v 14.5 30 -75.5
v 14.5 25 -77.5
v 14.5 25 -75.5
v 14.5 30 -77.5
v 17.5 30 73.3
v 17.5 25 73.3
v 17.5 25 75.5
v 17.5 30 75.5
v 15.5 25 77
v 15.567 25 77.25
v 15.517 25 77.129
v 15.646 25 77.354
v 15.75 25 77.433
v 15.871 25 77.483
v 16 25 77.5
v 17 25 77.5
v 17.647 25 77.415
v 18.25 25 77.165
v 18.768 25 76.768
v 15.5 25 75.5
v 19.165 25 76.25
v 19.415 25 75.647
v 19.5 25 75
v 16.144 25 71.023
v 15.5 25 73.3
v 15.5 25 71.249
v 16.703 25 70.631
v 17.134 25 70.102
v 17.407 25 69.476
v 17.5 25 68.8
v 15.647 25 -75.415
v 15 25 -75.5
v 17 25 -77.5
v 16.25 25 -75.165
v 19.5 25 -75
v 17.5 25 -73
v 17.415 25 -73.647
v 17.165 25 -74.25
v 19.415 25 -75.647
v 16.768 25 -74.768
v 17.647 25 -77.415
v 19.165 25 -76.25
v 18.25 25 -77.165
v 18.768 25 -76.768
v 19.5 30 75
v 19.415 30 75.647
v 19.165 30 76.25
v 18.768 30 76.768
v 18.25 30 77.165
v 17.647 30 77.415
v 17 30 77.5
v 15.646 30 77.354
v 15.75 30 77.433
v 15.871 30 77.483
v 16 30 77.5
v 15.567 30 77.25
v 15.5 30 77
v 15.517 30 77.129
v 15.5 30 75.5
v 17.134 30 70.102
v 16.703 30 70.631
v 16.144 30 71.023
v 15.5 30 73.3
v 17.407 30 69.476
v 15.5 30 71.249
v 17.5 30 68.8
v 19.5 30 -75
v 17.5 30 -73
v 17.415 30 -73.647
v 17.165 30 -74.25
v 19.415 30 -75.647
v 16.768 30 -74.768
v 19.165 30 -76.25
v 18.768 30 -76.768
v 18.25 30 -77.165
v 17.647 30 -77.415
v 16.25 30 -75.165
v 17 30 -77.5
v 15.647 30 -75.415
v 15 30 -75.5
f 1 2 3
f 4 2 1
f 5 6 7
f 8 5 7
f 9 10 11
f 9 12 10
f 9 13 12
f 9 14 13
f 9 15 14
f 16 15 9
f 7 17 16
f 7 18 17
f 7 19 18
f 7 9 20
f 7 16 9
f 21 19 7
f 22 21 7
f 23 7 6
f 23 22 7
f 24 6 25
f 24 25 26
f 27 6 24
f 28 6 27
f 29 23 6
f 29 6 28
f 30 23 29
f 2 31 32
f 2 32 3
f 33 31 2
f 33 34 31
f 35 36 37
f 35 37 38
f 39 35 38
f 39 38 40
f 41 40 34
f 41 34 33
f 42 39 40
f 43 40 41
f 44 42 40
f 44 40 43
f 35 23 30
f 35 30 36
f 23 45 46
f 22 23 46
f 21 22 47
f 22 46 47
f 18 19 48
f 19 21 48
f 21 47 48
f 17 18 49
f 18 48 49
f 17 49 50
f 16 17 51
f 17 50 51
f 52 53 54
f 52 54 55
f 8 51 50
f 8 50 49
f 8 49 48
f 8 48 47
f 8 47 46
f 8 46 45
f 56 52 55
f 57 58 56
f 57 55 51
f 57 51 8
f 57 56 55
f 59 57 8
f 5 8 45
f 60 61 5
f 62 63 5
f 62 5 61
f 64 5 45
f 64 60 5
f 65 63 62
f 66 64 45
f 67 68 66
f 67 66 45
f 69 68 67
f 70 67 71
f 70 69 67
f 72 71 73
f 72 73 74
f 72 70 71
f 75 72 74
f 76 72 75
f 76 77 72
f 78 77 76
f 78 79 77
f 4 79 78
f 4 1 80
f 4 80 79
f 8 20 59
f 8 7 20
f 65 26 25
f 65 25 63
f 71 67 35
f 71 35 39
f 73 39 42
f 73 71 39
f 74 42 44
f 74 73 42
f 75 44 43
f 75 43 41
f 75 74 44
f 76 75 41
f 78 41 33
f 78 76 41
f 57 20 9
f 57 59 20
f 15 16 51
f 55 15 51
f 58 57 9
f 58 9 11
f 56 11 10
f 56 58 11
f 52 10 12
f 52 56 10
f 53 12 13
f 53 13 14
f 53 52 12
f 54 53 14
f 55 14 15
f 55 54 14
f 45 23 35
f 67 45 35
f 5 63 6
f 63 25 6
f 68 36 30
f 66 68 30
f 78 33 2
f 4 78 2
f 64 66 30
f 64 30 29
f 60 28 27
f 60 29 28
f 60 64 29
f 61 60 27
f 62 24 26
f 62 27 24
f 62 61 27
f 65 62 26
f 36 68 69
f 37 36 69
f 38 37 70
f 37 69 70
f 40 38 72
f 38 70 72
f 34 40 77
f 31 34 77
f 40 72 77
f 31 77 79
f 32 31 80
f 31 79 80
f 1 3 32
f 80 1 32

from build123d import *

# Parameters (mm, degrees)
SKETCH1_W                       = 39
SKETCH1_H                       = 155
BOSS_EXTRUDE1_DEPTH             = 2
BOSS_EXTRUDE2_DEPTH             = 38
SKETCH3_W                       = 2
SKETCH3_H                       = 2
BOSS_EXTRUDE3_DEPTH             = 38
SKETCH4_W                       = 2
SKETCH4_H                       = 2
BOSS_EXTRUDE4_DEPTH             = 151
SKETCH6_W                       = 35
SKETCH6_H                       = 2.2
CUT_EXTRUDE1_DEPTH              = 160.340045186
SKETCH7_W                       = 35
SKETCH7_H                       = 2.2
CUT_EXTRUDE2_DEPTH              = 89.490112442
SKETCH5_W                       = 31
SKETCH5_H                       = 2
BOSS_EXTRUDE5_DEPTH             = 2
BOSS_EXTRUDE6_REACH             = 91.367
SKETCH8_W                       = 2
SKETCH8_H                       = 2
BOSS_EXTRUDE6_DIRECTION_2_REACH = 91.367
SKETCH10_W                      = 2
SKETCH10_H                      = 2.2
SKETCH10_W_2                    = 2.2
SKETCH10_H_2                    = 2
BOSS_EXTRUDE8_DEPTH             = 2
SKETCH11_W                      = 2
SKETCH11_H                      = 2.2
SKETCH11_W_2                    = 2.2
SKETCH11_H_2                    = 2
BOSS_EXTRUDE9_DEPTH             = 2
FILLET2_R                       = 2.5
SKETCH14_W                      = 36.5
SKETCH14_H                      = 7.75
BOSS_EXTRUDE10_DEPTH            = 2
SKETCH13_W                      = 31
SKETCH13_H                      = 3
CUT_EXTRUDE4_DEPTH              = 2
FILLET3_R                       = 2
FILLET4_R                       = 0.5
SKETCH15_R                      = 5.1
CUT_EXTRUDE5_DEPTH              = 90.367219941
SKETCH16_R                      = 7.1
BOSS_EXTRUDE11_DEPTH            = 1
FILLET5_R                       = 0.5
CUT_EXTRUDE3_DEPTH              = 160.340045186
FILLET6_R                       = 0.4
FILLET7_R                       = 0.5
CUT_EXTRUDE6_DEPTH              = 6
SKETCH18_W                      = 29
SKETCH18_H                      = 3
CUT_EXTRUDE8_DEPTH              = 90.367220028
CUT_EXTRUDE11_DEPTH             = 90.367220028
CUT_EXTRUDE11_DEPTH_BACK        = 90.367220028
SKETCH20_W                      = 29
SKETCH20_H                      = 34
SKETCH21_W                      = 155
SKETCH21_H                      = 10
CUT_EXTRUDE12_DEPTH             = 90.367219941
SKETCH22_W                      = 155
SKETCH22_H                      = 15
CUT_EXTRUDE13_DEPTH             = 84.254129027


with BuildPart() as part:
    # Sketch1 → Boss-Extrude1 (new body)
    with BuildSketch(Plane(origin=(0, 0, 0), x_dir=(1, 0, 0), z_dir=(0, 1, 0))):
        Rectangle(SKETCH1_W, SKETCH1_H)
    extrude(amount=BOSS_EXTRUDE1_DEPTH)

    # Sketch2 → Boss-Extrude2 (add)
    with BuildSketch(Plane(origin=(0, 2, 0), x_dir=(1, 0, 0), z_dir=(0, 1, 0))):
        Polygon((-17.5, -77.5), (-17.5, -75.5), (-17.5, 75.5), (17.5, 75.5), (17.5, -75.5), (17.5, -77.5), (19.5, -77.5), (19.5, 77.5), (-19.5, 77.5), (-19.5, -77.5), align=None)
    extrude(amount=BOSS_EXTRUDE2_DEPTH)

    # Sketch3 → Boss-Extrude3 (add)
    with BuildSketch(Plane(origin=(0, 2, 0), x_dir=(1, 0, 0), z_dir=(0, 1, 0))):
        with Locations((-16.5, -76.5)):
            Rectangle(SKETCH3_W, SKETCH3_H)
        with Locations((-16.5, -72.3)):
            Rectangle(SKETCH3_W, SKETCH3_H)
        with Locations((16.5, -76.5)):
            Rectangle(SKETCH3_W, SKETCH3_H)
        with Locations((16.5, -72.3)):
            Rectangle(SKETCH3_W, SKETCH3_H)
    extrude(amount=BOSS_EXTRUDE3_DEPTH)

    # Sketch4 → Boss-Extrude4 (add)
    with BuildSketch(Plane.XY.offset(-75.5)):
        with Locations((-16.5, 39)):
            Rectangle(SKETCH4_W, SKETCH4_H)
        Polygon((-15.5, 33.8), (-17.5, 31.8), (-17.5, 35.8), (-15.5, 35.8), align=None)
        Polygon((15.5, 35.8), (17.5, 35.8), (17.5, 31.8), (15.5, 33.8), align=None)
        with Locations((16.5, 39)):
            Rectangle(SKETCH4_W, SKETCH4_H)
    extrude(amount=BOSS_EXTRUDE4_DEPTH)

    # Sketch6 → Cut-Extrude1 (cut, through all)
    with BuildSketch(Plane.XY.offset(-75.5)):
        with Locations((0, 36.9)):
            Rectangle(SKETCH6_W, SKETCH6_H)
    extrude(amount=CUT_EXTRUDE1_DEPTH, mode=Mode.SUBTRACT)

    # Sketch7 → Cut-Extrude2 (cut, through all)
    with BuildSketch(Plane(origin=(0, 2, 0), x_dir=(1, 0, 0), z_dir=(0, 1, 0))):
        with Locations((0, -74.4)):
            Rectangle(SKETCH7_W, SKETCH7_H)
    extrude(amount=CUT_EXTRUDE2_DEPTH, mode=Mode.SUBTRACT)

    # Sketch5 → Boss-Extrude5 (add)
    with BuildSketch(Plane(origin=(0, 2, 0), x_dir=(1, 0, 0), z_dir=(0, 1, 0))):
        with Locations((0, -76.5)):
            Rectangle(SKETCH5_W, SKETCH5_H)
        with Locations((0, -72.3)):
            Rectangle(SKETCH5_W, SKETCH5_H)
    extrude(amount=BOSS_EXTRUDE5_DEPTH)

    # Boss-Extrude6: up to this face of the body (flat: up to its plane)
    boss_extrude6_end = Plane(part.part.faces().sort_by_distance((17.5, 16.9, -2.1))[0])
    # Sketch8 → Boss-Extrude6 (add, up to the picked face)
    with BuildSketch(Plane(origin=(0, 0, 0), x_dir=(0, 0, -1), z_dir=(1, 0, 0)), mode=Mode.PRIVATE) as boss_extrude6_sk1:
        with Locations((74.5, 39)):
            Rectangle(SKETCH8_W, SKETCH8_H)
    boss_extrude6_tool1 = split(extrude(boss_extrude6_sk1.sketch, amount=BOSS_EXTRUDE6_REACH, mode=Mode.PRIVATE), bisect_by=boss_extrude6_end, keep=Keep.BOTH, mode=Mode.PRIVATE)
    # Sketch8 → Boss-Extrude6 (add, up to the picked face)
    with BuildSketch(Plane(origin=(0, 0, 0), x_dir=(0, 0, -1), z_dir=(1, 0, 0)), mode=Mode.PRIVATE) as boss_extrude6_sk2:
        Polygon((75.5, 35.8), (73.5, 35.8), (73.5, 33.8), (75.5, 31.8), align=None)
    boss_extrude6_tool2 = split(extrude(boss_extrude6_sk2.sketch, amount=BOSS_EXTRUDE6_REACH, mode=Mode.PRIVATE), bisect_by=boss_extrude6_end, keep=Keep.BOTH, mode=Mode.PRIVATE)
    add(boss_extrude6_tool1.solids().sort_by(Axis((0, 39, -74.5), (1, 0, 0)))[0])
    add(boss_extrude6_tool2.solids().sort_by(Axis((0, 34.244444, -74.611111), (1, 0, 0)))[0])

    # Boss-Extrude6 direction 2: up to this face of the body (flat: up to its plane)
    boss_extrude6_direction_2_end = Plane(part.part.faces().sort_by_distance((-17.5, 16.9, -2.1))[0])
    # Sketch8 → Boss-Extrude6 direction 2 (add, up to the picked face)
    with BuildSketch(Plane(origin=(0, 0, 0), x_dir=(0, 0, -1), z_dir=(1, 0, 0)), mode=Mode.PRIVATE) as boss_extrude6_direction_2_sk1:
        with Locations((74.5, 39)):
            Rectangle(SKETCH8_W, SKETCH8_H)
    boss_extrude6_direction_2_tool1 = split(extrude(boss_extrude6_direction_2_sk1.sketch, amount=-BOSS_EXTRUDE6_DIRECTION_2_REACH, mode=Mode.PRIVATE), bisect_by=boss_extrude6_direction_2_end, keep=Keep.BOTH, mode=Mode.PRIVATE)
    # Sketch8 → Boss-Extrude6 direction 2 (add, up to the picked face)
    with BuildSketch(Plane(origin=(0, 0, 0), x_dir=(0, 0, -1), z_dir=(1, 0, 0)), mode=Mode.PRIVATE) as boss_extrude6_direction_2_sk2:
        Polygon((75.5, 35.8), (73.5, 35.8), (73.5, 33.8), (75.5, 31.8), align=None)
    boss_extrude6_direction_2_tool2 = split(extrude(boss_extrude6_direction_2_sk2.sketch, amount=-BOSS_EXTRUDE6_DIRECTION_2_REACH, mode=Mode.PRIVATE), bisect_by=boss_extrude6_direction_2_end, keep=Keep.BOTH, mode=Mode.PRIVATE)
    add(boss_extrude6_direction_2_tool1.solids().sort_by(Axis((0, 39, -74.5), (-1, 0, 0)))[0])
    add(boss_extrude6_direction_2_tool2.solids().sort_by(Axis((0, 34.244444, -74.611111), (-1, 0, 0)))[0])

    # Sketch10 → Boss-Extrude8 (add)
    with BuildSketch(Plane(origin=(-17.5, 0, 0), x_dir=(0, 0, -1), z_dir=(1, 0, 0))):
        with Locations((-76.5, 36.9)):
            Rectangle(SKETCH10_W, SKETCH10_H)
        with Locations((-74.4, 39)):
            Rectangle(SKETCH10_W_2, SKETCH10_H_2)
    extrude(amount=BOSS_EXTRUDE8_DEPTH)

    # Sketch11 → Boss-Extrude9 (add)
    with BuildSketch(Plane.ZY.offset(-17.5)):
        with Locations((76.5, 36.9)):
            Rectangle(SKETCH11_W, SKETCH11_H)
        with Locations((74.4, 39)):
            Rectangle(SKETCH11_W_2, SKETCH11_H_2)
    extrude(amount=BOSS_EXTRUDE9_DEPTH)

    # Fillet2
    fillet2_edges = [part.edges().sort_by_distance(p)[0] for p in [
        (-17.5, 16.9, 71.3),
        (17.5, 16.9, 71.3),
        (19.5, 20, 77.5),
        (-19.5, 20, 77.5),
        (-19.5, 20, -77.5),
        (-17.5, 16.9, -75.5),
        (17.5, 16.9, -75.5),
        (19.5, 20, -77.5),
        (19.5, 40, 0),
        (-19.5, 40, 0),
        (19.5, 0, 0),
        (-19.5, 0, 0),
        (0, 40, -77.5),
        (0, 0, 77.5),
        (0, 0, -77.5),
        (-17.5, 40, 77.5),
        (17.5, 40, 77.5),
    ]]
    fillet(fillet2_edges, radius=FILLET2_R)

    # Sketch14 → Boss-Extrude10 (add)
    with BuildSketch(Plane.XY.offset(-75.5)):
        with Locations((0, 5.125)):
            Rectangle(SKETCH14_W, SKETCH14_H)
    extrude(amount=BOSS_EXTRUDE10_DEPTH)

    # Sketch13 → Cut-Extrude4 (cut)
    with BuildSketch(Plane(origin=(0, 0, -77.5), x_dir=(-1, 0, 0), z_dir=(0, 0, -1))):
        with Locations((0, 5.5)):
            Rectangle(SKETCH13_W, SKETCH13_H)
    extrude(amount=-CUT_EXTRUDE4_DEPTH, mode=Mode.SUBTRACT)

    # Fillet3
    fillet3_edges = [part.edges().sort_by_distance(p)[0] for p in [
        (0, 9, -73.5),
    ]]
    fillet(fillet3_edges, radius=FILLET3_R - 0.0001)  # a hair under: the kernel refuses the full size

    # Fillet4
    fillet4_edges = [part.edges().sort_by_distance(p)[0] for p in [
        (15.5, 5.5, -75.5),
        (15.5, 4, -76.5),
        (0, 7, -75.5),
        (15.5, 7, -76.5),
        (-15.5, 5.5, -75.5),
        (-15.5, 7, -76.5),
        (0, 4, -75.5),
        (-15.5, 4, -76.5),
        (15.5, 5.5, -77.5),
        (0, 4, -77.5),
        (-15.5, 5.5, -77.5),
        (0, 7, -77.5),
    ]]
    fillet(fillet4_edges, radius=FILLET4_R)

    # Sketch15 → Cut-Extrude5 (cut, through all)
    with BuildSketch(Plane.XZ):
        with Locations(Location((0, 38.75, 0), (0, 0, 270))):
            Circle(SKETCH15_R)
        with Locations(Location((0, -38.75, 0), (0, 0, 270))):
            Circle(SKETCH15_R)
    extrude(amount=-CUT_EXTRUDE5_DEPTH, mode=Mode.SUBTRACT)

    # Sketch16 → Boss-Extrude11 (add)
    with BuildSketch(Plane(origin=(0, 2, 0), x_dir=(1, 0, 0), z_dir=(0, 1, 0))):
        with Locations(Location((0, 38.75, 0), (0, 0, 270))):
            Circle(SKETCH16_R)
        with Locations(Location((0, -38.75, 0), (0, 0, 270))):
            Circle(SKETCH16_R)
    extrude(amount=BOSS_EXTRUDE11_DEPTH)

    # Fillet5
    fillet5_edges = [part.edges().sort_by_distance(p)[0] for p in [
        (0, 2, -45.85),
        (0, 3, -45.85),
        (0, 2, 31.65),
        (0, 3, 31.65),
    ]]
    fillet(fillet5_edges, radius=FILLET5_R - 0.0001)  # a hair under: the kernel refuses the full size

    # Sketch12 → Cut-Extrude3 (cut, through all)
    with BuildSketch(Plane.XY.offset(-75.5)):
        with BuildLine():
            Line((1.668907005, 12.688040659), (2.22520934, 10.250720878))
            ThreePointArc((2.22520934, 10.250720878), (4.338837391, 10.990311321), (6.234898019, 12.181685175))
            Line((6.234898019, 12.181685175), (4.676173514, 14.136263881))
            ThreePointArc((4.676173514, 14.136263881), (3.254128043, 13.242733491), (1.668907005, 12.688040659))
        make_face()
        with BuildLine():
            ThreePointArc((-6.234898019, 12.181685175), (-4.338837391, 10.990311321), (-2.22520934, 10.250720878))
            Line((-2.22520934, 10.250720878), (-1.668907005, 12.688040659))
            ThreePointArc((-1.668907005, 12.688040659), (-3.254128043, 13.242733491), (-4.676173514, 14.136263881))
            Line((-4.676173514, 14.136263881), (-6.234898019, 12.181685175))
        make_face()
        with BuildLine():
            ThreePointArc((-10, 20), (-9.749279122, 17.77479066), (-9.009688679, 15.661162609))
            Line((-9.009688679, 15.661162609), (-6.757266509, 16.745871957))
            ThreePointArc((-6.757266509, 16.745871957), (-7.311959341, 18.331092995), (-7.5, 20))
            Line((-7.5, 20), (-10, 20))
        make_face()
        with BuildLine():
            ThreePointArc((-6.234898019, 27.818314825), (-7.818314825, 26.234898019), (-9.009688679, 24.338837391))
            Line((-9.009688679, 24.338837391), (-6.757266509, 23.254128043))
            ThreePointArc((-6.757266509, 23.254128043), (-5.863736119, 24.676173514), (-4.676173514, 25.863736119))
            Line((-4.676173514, 25.863736119), (-6.234898019, 27.818314825))
        make_face()
        with BuildLine():
            ThreePointArc((-1.668907005, 27.311959341), (-0.839733571, 27.452841574), (0, 27.5))
            Line((0, 27.5), (0, 30))
            ThreePointArc((0, 30), (-1.119644761, 29.937122099), (-2.22520934, 29.749279122))
            Line((-2.22520934, 29.749279122), (-1.668907005, 27.311959341))
        make_face()
        with BuildLine():
            Line((0, 30), (0, 27.5))
            ThreePointArc((0, 27.5), (0.839733571, 27.452841574), (1.668907005, 27.311959341))
            Line((1.668907005, 27.311959341), (2.22520934, 29.749279122))
            ThreePointArc((2.22520934, 29.749279122), (1.119644761, 29.937122099), (0, 30))
        make_face()
        with BuildLine():
            Line((6.757266509, 23.254128043), (9.009688679, 24.338837391))
            ThreePointArc((9.009688679, 24.338837391), (7.818314825, 26.234898019), (6.234898019, 27.818314825))
            Line((6.234898019, 27.818314825), (4.676173514, 25.863736119))
            ThreePointArc((4.676173514, 25.863736119), (5.863736119, 24.676173514), (6.757266509, 23.254128043))
        make_face()
        with BuildLine():
            Line((6.757266509, 16.745871957), (9.009688679, 15.661162609))
            ThreePointArc((9.009688679, 15.661162609), (9.749279122, 17.77479066), (10, 20))
            Line((10, 20), (7.5, 20))
            ThreePointArc((7.5, 20), (7.311959341, 18.331092995), (6.757266509, 16.745871957))
        make_face()
        with BuildLine():
            ThreePointArc((2.5, 20), (2.43731978, 19.443697665), (2.25242217, 18.915290652))
            Line((2.25242217, 18.915290652), (4.50484434, 17.830581304))
            ThreePointArc((4.50484434, 17.830581304), (4.874639561, 18.88739533), (5, 20))
            Line((5, 20), (2.5, 20))
        make_face()
        with BuildLine():
            ThreePointArc((1.558724505, 21.954578706), (1.954578706, 21.558724505), (2.25242217, 21.084709348))
            Line((2.25242217, 21.084709348), (4.50484434, 22.169418696))
            ThreePointArc((4.50484434, 22.169418696), (3.909157412, 23.117449009), (3.117449009, 23.909157412))
            Line((3.117449009, 23.909157412), (1.558724505, 21.954578706))
        make_face()
        with BuildLine():
            Line((0, 25), (0, 22.5))
            ThreePointArc((0, 22.5), (0.27991119, 22.484280525), (0.556302335, 22.43731978))
            Line((0.556302335, 22.43731978), (1.11260467, 24.874639561))
            ThreePointArc((1.11260467, 24.874639561), (0.559822381, 24.968561049), (0, 25))
        make_face()
        with BuildLine():
            ThreePointArc((-0.556302335, 22.43731978), (-0.27991119, 22.484280525), (0, 22.5))
            Line((0, 22.5), (0, 25))
            ThreePointArc((0, 25), (-0.559822381, 24.968561049), (-1.11260467, 24.874639561))
            Line((-1.11260467, 24.874639561), (-0.556302335, 22.43731978))
        make_face()
        with BuildLine():
            ThreePointArc((-2.25242217, 21.084709348), (-1.954578706, 21.558724505), (-1.558724505, 21.954578706))
            Line((-1.558724505, 21.954578706), (-3.117449009, 23.909157412))
            ThreePointArc((-3.117449009, 23.909157412), (-3.909157412, 23.117449009), (-4.50484434, 22.169418696))
            Line((-4.50484434, 22.169418696), (-2.25242217, 21.084709348))
        make_face()
        with BuildLine():
            ThreePointArc((-2.25242217, 18.915290652), (-2.43731978, 19.443697665), (-2.5, 20))
            Line((-2.5, 20), (-5, 20))
            ThreePointArc((-5, 20), (-4.874639561, 18.88739533), (-4.50484434, 17.830581304))
            Line((-4.50484434, 17.830581304), (-2.25242217, 18.915290652))
        make_face()
        with BuildLine():
            ThreePointArc((-3.117449009, 16.090842588), (-2.169418696, 15.49515566), (-1.11260467, 15.125360439))
            Line((-1.11260467, 15.125360439), (-0.556302335, 17.56268022))
            ThreePointArc((-0.556302335, 17.56268022), (-1.084709348, 17.74757783), (-1.558724505, 18.045421294))
            Line((-1.558724505, 18.045421294), (-3.117449009, 16.090842588))
        make_face()
        with BuildLine():
            Line((0.556302335, 17.56268022), (1.11260467, 15.125360439))
            ThreePointArc((1.11260467, 15.125360439), (2.169418696, 15.49515566), (3.117449009, 16.090842588))
            Line((3.117449009, 16.090842588), (1.558724505, 18.045421294))
            ThreePointArc((1.558724505, 18.045421294), (1.084709348, 17.74757783), (0.556302335, 17.56268022))
        make_face()
    extrude(amount=-CUT_EXTRUDE3_DEPTH, mode=Mode.SUBTRACT)

    # Fillet6
    fillet6_edges = [part.edges().sort_by_distance(p)[0] for p in [
        (5.863736119, 24.676173514, -75.5),
        (5.455535766, 26.841025472, -75.5),
        (7.818314825, 26.234898019, -77.5),
        (7.883477594, 23.796482717, -77.5),
        (5.863736119, 24.676173514, -77.5),
        (5.455535766, 26.841025472, -77.5),
        (7.883477594, 23.796482717, -75.5),
        (7.818314825, 26.234898019, -75.5),
        (7.311959341, 18.331092995, -75.5),
        (8.75, 20, -75.5),
        (9.749279122, 17.77479066, -77.5),
        (7.883477594, 16.203517283, -77.5),
        (7.311959341, 18.331092995, -77.5),
        (8.75, 20, -77.5),
        (7.883477594, 16.203517283, -75.5),
        (9.749279122, 17.77479066, -75.5),
        (2.43731978, 19.443697665, -75.5),
        (3.75, 20, -75.5),
        (4.874639561, 18.88739533, -77.5),
        (3.378633255, 18.372935978, -77.5),
        (2.43731978, 19.443697665, -77.5),
        (3.75, 20, -77.5),
        (3.378633255, 18.372935978, -75.5),
        (4.874639561, 18.88739533, -75.5),
        (1.954578706, 21.558724505, -75.5),
        (2.338086757, 22.931868059, -75.5),
        (3.909157412, 23.117449009, -77.5),
        (3.378633255, 21.627064022, -77.5),
        (1.954578706, 21.558724505, -77.5),
        (2.338086757, 22.931868059, -77.5),
        (3.378633255, 21.627064022, -75.5),
        (3.909157412, 23.117449009, -75.5),
        (0, 27.5, -75.5),
        (-1.947058172, 28.530619232, -75.5),
        (0, 30, -77.5),
        (1.947058172, 28.530619232, -77.5),
        (0, 27.5, -77.5),
        (-1.947058172, 28.530619232, -77.5),
        (1.947058172, 28.530619232, -75.5),
        (0, 30, -75.5),
        (-5.863736119, 24.676173514, -75.5),
        (-7.883477594, 23.796482717, -75.5),
        (-7.818314825, 26.234898019, -77.5),
        (-5.455535766, 26.841025472, -77.5),
        (-5.863736119, 24.676173514, -77.5),
        (-7.883477594, 23.796482717, -77.5),
        (-5.455535766, 26.841025472, -75.5),
        (-7.818314825, 26.234898019, -75.5),
        (-7.311959341, 18.331092995, -75.5),
        (-7.883477594, 16.203517283, -75.5),
        (-9.749279122, 17.77479066, -77.5),
        (-8.75, 20, -77.5),
        (-7.311959341, 18.331092995, -77.5),
        (-7.883477594, 16.203517283, -77.5),
        (-8.75, 20, -75.5),
        (-9.749279122, 17.77479066, -75.5),
        (-3.254128043, 13.242733491, -75.5),
        (-1.947058172, 11.469380768, -75.5),
        (-4.338837391, 10.990311321, -77.5),
        (-5.455535766, 13.158974528, -77.5),
        (-3.254128043, 13.242733491, -77.5),
        (-1.947058172, 11.469380768, -77.5),
        (-5.455535766, 13.158974528, -75.5),
        (-4.338837391, 10.990311321, -75.5),
        (1.084709348, 17.74757783, -75.5),
        (2.338086757, 17.068131941, -75.5),
        (2.169418696, 15.49515566, -77.5),
        (0.834453502, 16.344020329, -77.5),
        (1.084709348, 17.74757783, -77.5),
        (2.338086757, 17.068131941, -77.5),
        (0.834453502, 16.344020329, -75.5),
        (2.169418696, 15.49515566, -75.5),
        (-2.43731978, 19.443697665, -75.5),
        (-3.378633255, 18.372935978, -75.5),
        (-4.874639561, 18.88739533, -77.5),
        (-3.75, 20, -77.5),
        (-2.43731978, 19.443697665, -77.5),
        (-3.378633255, 18.372935978, -77.5),
        (-3.75, 20, -75.5),
        (-4.874639561, 18.88739533, -75.5),
        (-1.084709348, 17.74757783, -75.5),
        (-0.834453502, 16.344020329, -75.5),
        (-2.169418696, 15.49515566, -77.5),
        (-2.338086757, 17.068131941, -77.5),
        (-1.084709348, 17.74757783, -77.5),
        (-0.834453502, 16.344020329, -77.5),
        (-2.338086757, 17.068131941, -75.5),
        (-2.169418696, 15.49515566, -75.5),
        (-1.954578706, 21.558724505, -75.5),
        (-3.378633255, 21.627064022, -75.5),
        (-3.909157412, 23.117449009, -77.5),
        (-2.338086757, 22.931868059, -77.5),
        (-1.954578706, 21.558724505, -77.5),
        (-3.378633255, 21.627064022, -77.5),
        (-2.338086757, 22.931868059, -75.5),
        (-3.909157412, 23.117449009, -75.5),
        (0, 25, -77.5),
        (0.834453502, 23.655979671, -77.5),
        (0, 22.5, -75.5),
        (-0.834453502, 23.655979671, -75.5),
        (0, 22.5, -77.5),
        (-0.834453502, 23.655979671, -77.5),
        (0, 25, -75.5),
        (0.834453502, 23.655979671, -75.5),
        (3.254128043, 13.242733491, -75.5),
        (5.455535766, 13.158974528, -75.5),
        (4.338837391, 10.990311321, -77.5),
        (1.947058172, 11.469380768, -77.5),
        (3.254128043, 13.242733491, -77.5),
        (5.455535766, 13.158974528, -77.5),
        (1.947058172, 11.469380768, -75.5),
        (4.338837391, 10.990311321, -75.5),
    ]]
    fillet(fillet6_edges, radius=FILLET6_R)

    # Fillet7
    fillet7_edges = [part.edges().sort_by_distance(p)[0] for p in [
        (15.5, 40, 0.75),
        (0, 4, 77.5),
        (0, 40, -73.5),
        (-15.5, 40, 0.75),
        (-15.5, 20.75, 77.5),
        (-15.5, 39.267766953, 76.767766953),
        (15.5, 20.75, 77.5),
        (15.5, 39.267766953, 76.767766953),
    ]]
    fillet(fillet7_edges, radius=FILLET7_R)

    # Sketch17 → Cut-Extrude6 (cut)
    with BuildSketch(Plane.XZ):
        Polygon((-17, -77.5), (-17, 70.299999999), (-14.999999999, 71.3), (-14.999999999, 77.5), (14.999999999, 77.5), (14.999999999, 71.3), (17, 70.299999999), (17, -77.5), align=None)
    extrude(amount=-CUT_EXTRUDE6_DEPTH, mode=Mode.SUBTRACT)

    # Sketch18 → Cut-Extrude8 (cut, through all)
    with BuildSketch(Plane.XY):
        with Locations((0, 7.5)):
            Rectangle(SKETCH18_W, SKETCH18_H)
    extrude(amount=-CUT_EXTRUDE8_DEPTH, mode=Mode.SUBTRACT)

    # Sketch20 → Cut-Extrude11 (cut, two sides: drawn at the far end of the back side and taken through both)
    with BuildSketch(Plane.XY.offset(-CUT_EXTRUDE11_DEPTH_BACK)):
        with Locations((0, 23)):
            Rectangle(SKETCH20_W, SKETCH20_H)
    extrude(amount=CUT_EXTRUDE11_DEPTH + CUT_EXTRUDE11_DEPTH_BACK, mode=Mode.SUBTRACT)


with BuildPart() as body_2:
    # of the pieces the cut leaves, the one that is kept (cut_extrude11_keep)
    add(part.part.solids().sort_by_distance((14.5, 40, -75))[0])

    # Sketch21 → Cut-Extrude12 (cut, through all)
    with BuildSketch(Plane(origin=(0, 0, 0), x_dir=(0, 0, -1), z_dir=(1, 0, 0))):
        with Locations((0, 35)):
            Rectangle(SKETCH21_W, SKETCH21_H)
        with Locations((0, 5)):
            Rectangle(SKETCH21_W, SKETCH21_H)
    extrude(amount=CUT_EXTRUDE12_DEPTH, mode=Mode.SUBTRACT)

    # Sketch22 → Cut-Extrude13 (cut, through all)
    with BuildSketch(Plane(origin=(19.5, 0, 0), x_dir=(0, 0, -1), z_dir=(1, 0, 0))):
        with Locations((0, 17.5)):
            Rectangle(SKETCH22_W, SKETCH22_H)
    extrude(amount=-CUT_EXTRUDE13_DEPTH, mode=Mode.SUBTRACT)


solid = body_2.part
